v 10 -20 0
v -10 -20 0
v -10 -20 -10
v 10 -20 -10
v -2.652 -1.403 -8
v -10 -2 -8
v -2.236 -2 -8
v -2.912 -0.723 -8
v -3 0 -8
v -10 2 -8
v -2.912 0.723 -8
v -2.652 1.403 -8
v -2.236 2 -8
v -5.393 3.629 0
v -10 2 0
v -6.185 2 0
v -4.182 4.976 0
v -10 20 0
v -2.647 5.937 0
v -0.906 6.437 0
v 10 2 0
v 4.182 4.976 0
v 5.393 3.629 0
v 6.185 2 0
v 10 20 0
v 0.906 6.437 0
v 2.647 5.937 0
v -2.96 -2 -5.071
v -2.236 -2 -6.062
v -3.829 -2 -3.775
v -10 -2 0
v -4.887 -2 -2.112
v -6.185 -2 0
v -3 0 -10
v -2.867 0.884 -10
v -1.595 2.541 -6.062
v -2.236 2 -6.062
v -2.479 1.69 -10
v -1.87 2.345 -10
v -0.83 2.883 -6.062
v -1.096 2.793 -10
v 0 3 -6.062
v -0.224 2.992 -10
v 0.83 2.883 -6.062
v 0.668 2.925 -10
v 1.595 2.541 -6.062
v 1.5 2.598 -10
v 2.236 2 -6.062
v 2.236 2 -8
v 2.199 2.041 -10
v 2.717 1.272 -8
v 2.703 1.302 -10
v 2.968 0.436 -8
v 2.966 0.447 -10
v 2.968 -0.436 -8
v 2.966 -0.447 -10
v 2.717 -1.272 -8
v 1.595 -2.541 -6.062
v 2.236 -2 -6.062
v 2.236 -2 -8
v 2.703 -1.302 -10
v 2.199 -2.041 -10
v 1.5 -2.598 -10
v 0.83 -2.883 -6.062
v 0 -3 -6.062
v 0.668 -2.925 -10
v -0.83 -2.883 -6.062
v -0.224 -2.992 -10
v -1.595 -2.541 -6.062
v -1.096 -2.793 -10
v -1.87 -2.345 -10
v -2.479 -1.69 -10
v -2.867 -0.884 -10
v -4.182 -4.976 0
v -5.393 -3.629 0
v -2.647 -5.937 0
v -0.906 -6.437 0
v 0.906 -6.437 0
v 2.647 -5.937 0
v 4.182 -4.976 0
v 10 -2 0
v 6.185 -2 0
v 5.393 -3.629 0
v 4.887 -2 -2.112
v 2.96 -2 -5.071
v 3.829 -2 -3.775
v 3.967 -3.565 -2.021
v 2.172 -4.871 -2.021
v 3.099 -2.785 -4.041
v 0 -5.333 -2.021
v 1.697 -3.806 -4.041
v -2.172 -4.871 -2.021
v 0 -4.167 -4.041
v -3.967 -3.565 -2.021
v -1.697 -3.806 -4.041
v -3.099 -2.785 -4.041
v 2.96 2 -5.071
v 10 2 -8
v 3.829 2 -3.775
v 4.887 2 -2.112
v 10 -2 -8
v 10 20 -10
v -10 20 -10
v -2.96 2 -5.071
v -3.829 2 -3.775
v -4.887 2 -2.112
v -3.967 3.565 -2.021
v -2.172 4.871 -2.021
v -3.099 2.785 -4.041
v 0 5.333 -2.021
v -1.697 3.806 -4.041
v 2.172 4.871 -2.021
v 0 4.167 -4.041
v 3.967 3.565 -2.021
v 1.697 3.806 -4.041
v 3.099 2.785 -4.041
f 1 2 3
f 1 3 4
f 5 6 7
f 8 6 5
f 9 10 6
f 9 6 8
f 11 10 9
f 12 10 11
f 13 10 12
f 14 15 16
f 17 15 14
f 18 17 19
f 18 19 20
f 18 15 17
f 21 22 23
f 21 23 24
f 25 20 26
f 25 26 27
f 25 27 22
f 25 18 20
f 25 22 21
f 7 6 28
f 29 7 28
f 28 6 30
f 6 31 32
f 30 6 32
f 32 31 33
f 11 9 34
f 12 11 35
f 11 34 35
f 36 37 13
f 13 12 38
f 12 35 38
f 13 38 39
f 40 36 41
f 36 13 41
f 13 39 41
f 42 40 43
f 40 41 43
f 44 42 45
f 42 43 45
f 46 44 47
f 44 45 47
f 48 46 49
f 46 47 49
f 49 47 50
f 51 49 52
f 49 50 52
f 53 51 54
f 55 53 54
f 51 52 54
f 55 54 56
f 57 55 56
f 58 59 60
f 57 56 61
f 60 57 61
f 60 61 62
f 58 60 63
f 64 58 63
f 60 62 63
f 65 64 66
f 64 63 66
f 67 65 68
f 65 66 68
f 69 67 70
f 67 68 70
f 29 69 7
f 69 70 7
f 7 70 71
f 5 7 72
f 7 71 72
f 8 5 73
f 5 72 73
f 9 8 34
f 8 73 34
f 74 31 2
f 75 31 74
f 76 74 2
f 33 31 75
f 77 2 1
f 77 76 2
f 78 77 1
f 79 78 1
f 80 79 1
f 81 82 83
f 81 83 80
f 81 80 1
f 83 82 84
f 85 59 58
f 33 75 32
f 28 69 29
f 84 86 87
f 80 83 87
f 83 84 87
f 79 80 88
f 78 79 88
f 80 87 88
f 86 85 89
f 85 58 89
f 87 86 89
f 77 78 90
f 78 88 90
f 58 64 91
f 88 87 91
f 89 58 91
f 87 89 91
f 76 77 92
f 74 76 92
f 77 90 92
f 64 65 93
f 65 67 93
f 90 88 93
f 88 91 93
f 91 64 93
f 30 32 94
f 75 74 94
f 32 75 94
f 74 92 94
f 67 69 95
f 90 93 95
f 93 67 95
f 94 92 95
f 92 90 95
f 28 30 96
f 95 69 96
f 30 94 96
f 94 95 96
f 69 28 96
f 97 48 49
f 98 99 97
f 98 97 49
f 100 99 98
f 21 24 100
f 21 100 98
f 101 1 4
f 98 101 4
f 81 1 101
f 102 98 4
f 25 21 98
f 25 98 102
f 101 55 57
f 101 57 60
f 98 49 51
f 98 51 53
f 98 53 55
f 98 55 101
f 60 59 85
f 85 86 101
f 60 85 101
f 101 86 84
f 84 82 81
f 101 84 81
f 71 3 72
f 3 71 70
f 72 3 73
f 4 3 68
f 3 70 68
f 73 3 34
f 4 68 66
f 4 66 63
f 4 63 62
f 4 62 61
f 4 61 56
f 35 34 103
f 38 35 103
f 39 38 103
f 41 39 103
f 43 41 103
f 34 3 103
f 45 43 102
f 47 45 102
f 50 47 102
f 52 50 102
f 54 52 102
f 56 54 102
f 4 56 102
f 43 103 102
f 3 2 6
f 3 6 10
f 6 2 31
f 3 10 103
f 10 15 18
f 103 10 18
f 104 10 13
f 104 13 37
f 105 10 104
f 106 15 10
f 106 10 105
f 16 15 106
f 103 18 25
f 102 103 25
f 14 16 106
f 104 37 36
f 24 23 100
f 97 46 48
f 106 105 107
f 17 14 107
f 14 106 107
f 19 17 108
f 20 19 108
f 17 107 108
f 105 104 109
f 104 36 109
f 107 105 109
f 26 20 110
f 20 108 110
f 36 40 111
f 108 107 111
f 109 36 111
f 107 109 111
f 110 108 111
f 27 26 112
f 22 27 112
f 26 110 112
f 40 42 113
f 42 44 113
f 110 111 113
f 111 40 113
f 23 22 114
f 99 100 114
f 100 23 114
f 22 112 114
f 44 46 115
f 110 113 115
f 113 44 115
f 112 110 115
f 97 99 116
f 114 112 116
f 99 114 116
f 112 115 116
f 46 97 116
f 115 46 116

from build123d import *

# Parameters (mm, degrees)
SKETCH_W         = 20
SKETCH_H         = 40
PAD_DEPTH        = 10
HOLE_D           = 6
HOLE_CSINK_D     = 13
HOLE_CSINK_ANGLE = 60
SKETCH002_W      = 20
SKETCH002_H      = 4
POCKET_DEPTH     = 8


with BuildPart() as part:
    # Sketch → Pad (new body)
    with BuildSketch(Plane.XY):
        Rectangle(SKETCH_W, SKETCH_H)
    extrude(amount=-PAD_DEPTH)

    # Hole (through all)
    with Locations(Plane.XY):
        with Locations((0, 0)):
            CounterSinkHole(HOLE_D / 2, HOLE_CSINK_D / 2, counter_sink_angle=HOLE_CSINK_ANGLE)

    # Sketch002 (on Face4 of Hole) → Pocket (cut)
    with BuildSketch(Plane.XY):
        Rectangle(SKETCH002_W, SKETCH002_H)
    extrude(amount=-POCKET_DEPTH, mode=Mode.SUBTRACT)


solid = part.part
